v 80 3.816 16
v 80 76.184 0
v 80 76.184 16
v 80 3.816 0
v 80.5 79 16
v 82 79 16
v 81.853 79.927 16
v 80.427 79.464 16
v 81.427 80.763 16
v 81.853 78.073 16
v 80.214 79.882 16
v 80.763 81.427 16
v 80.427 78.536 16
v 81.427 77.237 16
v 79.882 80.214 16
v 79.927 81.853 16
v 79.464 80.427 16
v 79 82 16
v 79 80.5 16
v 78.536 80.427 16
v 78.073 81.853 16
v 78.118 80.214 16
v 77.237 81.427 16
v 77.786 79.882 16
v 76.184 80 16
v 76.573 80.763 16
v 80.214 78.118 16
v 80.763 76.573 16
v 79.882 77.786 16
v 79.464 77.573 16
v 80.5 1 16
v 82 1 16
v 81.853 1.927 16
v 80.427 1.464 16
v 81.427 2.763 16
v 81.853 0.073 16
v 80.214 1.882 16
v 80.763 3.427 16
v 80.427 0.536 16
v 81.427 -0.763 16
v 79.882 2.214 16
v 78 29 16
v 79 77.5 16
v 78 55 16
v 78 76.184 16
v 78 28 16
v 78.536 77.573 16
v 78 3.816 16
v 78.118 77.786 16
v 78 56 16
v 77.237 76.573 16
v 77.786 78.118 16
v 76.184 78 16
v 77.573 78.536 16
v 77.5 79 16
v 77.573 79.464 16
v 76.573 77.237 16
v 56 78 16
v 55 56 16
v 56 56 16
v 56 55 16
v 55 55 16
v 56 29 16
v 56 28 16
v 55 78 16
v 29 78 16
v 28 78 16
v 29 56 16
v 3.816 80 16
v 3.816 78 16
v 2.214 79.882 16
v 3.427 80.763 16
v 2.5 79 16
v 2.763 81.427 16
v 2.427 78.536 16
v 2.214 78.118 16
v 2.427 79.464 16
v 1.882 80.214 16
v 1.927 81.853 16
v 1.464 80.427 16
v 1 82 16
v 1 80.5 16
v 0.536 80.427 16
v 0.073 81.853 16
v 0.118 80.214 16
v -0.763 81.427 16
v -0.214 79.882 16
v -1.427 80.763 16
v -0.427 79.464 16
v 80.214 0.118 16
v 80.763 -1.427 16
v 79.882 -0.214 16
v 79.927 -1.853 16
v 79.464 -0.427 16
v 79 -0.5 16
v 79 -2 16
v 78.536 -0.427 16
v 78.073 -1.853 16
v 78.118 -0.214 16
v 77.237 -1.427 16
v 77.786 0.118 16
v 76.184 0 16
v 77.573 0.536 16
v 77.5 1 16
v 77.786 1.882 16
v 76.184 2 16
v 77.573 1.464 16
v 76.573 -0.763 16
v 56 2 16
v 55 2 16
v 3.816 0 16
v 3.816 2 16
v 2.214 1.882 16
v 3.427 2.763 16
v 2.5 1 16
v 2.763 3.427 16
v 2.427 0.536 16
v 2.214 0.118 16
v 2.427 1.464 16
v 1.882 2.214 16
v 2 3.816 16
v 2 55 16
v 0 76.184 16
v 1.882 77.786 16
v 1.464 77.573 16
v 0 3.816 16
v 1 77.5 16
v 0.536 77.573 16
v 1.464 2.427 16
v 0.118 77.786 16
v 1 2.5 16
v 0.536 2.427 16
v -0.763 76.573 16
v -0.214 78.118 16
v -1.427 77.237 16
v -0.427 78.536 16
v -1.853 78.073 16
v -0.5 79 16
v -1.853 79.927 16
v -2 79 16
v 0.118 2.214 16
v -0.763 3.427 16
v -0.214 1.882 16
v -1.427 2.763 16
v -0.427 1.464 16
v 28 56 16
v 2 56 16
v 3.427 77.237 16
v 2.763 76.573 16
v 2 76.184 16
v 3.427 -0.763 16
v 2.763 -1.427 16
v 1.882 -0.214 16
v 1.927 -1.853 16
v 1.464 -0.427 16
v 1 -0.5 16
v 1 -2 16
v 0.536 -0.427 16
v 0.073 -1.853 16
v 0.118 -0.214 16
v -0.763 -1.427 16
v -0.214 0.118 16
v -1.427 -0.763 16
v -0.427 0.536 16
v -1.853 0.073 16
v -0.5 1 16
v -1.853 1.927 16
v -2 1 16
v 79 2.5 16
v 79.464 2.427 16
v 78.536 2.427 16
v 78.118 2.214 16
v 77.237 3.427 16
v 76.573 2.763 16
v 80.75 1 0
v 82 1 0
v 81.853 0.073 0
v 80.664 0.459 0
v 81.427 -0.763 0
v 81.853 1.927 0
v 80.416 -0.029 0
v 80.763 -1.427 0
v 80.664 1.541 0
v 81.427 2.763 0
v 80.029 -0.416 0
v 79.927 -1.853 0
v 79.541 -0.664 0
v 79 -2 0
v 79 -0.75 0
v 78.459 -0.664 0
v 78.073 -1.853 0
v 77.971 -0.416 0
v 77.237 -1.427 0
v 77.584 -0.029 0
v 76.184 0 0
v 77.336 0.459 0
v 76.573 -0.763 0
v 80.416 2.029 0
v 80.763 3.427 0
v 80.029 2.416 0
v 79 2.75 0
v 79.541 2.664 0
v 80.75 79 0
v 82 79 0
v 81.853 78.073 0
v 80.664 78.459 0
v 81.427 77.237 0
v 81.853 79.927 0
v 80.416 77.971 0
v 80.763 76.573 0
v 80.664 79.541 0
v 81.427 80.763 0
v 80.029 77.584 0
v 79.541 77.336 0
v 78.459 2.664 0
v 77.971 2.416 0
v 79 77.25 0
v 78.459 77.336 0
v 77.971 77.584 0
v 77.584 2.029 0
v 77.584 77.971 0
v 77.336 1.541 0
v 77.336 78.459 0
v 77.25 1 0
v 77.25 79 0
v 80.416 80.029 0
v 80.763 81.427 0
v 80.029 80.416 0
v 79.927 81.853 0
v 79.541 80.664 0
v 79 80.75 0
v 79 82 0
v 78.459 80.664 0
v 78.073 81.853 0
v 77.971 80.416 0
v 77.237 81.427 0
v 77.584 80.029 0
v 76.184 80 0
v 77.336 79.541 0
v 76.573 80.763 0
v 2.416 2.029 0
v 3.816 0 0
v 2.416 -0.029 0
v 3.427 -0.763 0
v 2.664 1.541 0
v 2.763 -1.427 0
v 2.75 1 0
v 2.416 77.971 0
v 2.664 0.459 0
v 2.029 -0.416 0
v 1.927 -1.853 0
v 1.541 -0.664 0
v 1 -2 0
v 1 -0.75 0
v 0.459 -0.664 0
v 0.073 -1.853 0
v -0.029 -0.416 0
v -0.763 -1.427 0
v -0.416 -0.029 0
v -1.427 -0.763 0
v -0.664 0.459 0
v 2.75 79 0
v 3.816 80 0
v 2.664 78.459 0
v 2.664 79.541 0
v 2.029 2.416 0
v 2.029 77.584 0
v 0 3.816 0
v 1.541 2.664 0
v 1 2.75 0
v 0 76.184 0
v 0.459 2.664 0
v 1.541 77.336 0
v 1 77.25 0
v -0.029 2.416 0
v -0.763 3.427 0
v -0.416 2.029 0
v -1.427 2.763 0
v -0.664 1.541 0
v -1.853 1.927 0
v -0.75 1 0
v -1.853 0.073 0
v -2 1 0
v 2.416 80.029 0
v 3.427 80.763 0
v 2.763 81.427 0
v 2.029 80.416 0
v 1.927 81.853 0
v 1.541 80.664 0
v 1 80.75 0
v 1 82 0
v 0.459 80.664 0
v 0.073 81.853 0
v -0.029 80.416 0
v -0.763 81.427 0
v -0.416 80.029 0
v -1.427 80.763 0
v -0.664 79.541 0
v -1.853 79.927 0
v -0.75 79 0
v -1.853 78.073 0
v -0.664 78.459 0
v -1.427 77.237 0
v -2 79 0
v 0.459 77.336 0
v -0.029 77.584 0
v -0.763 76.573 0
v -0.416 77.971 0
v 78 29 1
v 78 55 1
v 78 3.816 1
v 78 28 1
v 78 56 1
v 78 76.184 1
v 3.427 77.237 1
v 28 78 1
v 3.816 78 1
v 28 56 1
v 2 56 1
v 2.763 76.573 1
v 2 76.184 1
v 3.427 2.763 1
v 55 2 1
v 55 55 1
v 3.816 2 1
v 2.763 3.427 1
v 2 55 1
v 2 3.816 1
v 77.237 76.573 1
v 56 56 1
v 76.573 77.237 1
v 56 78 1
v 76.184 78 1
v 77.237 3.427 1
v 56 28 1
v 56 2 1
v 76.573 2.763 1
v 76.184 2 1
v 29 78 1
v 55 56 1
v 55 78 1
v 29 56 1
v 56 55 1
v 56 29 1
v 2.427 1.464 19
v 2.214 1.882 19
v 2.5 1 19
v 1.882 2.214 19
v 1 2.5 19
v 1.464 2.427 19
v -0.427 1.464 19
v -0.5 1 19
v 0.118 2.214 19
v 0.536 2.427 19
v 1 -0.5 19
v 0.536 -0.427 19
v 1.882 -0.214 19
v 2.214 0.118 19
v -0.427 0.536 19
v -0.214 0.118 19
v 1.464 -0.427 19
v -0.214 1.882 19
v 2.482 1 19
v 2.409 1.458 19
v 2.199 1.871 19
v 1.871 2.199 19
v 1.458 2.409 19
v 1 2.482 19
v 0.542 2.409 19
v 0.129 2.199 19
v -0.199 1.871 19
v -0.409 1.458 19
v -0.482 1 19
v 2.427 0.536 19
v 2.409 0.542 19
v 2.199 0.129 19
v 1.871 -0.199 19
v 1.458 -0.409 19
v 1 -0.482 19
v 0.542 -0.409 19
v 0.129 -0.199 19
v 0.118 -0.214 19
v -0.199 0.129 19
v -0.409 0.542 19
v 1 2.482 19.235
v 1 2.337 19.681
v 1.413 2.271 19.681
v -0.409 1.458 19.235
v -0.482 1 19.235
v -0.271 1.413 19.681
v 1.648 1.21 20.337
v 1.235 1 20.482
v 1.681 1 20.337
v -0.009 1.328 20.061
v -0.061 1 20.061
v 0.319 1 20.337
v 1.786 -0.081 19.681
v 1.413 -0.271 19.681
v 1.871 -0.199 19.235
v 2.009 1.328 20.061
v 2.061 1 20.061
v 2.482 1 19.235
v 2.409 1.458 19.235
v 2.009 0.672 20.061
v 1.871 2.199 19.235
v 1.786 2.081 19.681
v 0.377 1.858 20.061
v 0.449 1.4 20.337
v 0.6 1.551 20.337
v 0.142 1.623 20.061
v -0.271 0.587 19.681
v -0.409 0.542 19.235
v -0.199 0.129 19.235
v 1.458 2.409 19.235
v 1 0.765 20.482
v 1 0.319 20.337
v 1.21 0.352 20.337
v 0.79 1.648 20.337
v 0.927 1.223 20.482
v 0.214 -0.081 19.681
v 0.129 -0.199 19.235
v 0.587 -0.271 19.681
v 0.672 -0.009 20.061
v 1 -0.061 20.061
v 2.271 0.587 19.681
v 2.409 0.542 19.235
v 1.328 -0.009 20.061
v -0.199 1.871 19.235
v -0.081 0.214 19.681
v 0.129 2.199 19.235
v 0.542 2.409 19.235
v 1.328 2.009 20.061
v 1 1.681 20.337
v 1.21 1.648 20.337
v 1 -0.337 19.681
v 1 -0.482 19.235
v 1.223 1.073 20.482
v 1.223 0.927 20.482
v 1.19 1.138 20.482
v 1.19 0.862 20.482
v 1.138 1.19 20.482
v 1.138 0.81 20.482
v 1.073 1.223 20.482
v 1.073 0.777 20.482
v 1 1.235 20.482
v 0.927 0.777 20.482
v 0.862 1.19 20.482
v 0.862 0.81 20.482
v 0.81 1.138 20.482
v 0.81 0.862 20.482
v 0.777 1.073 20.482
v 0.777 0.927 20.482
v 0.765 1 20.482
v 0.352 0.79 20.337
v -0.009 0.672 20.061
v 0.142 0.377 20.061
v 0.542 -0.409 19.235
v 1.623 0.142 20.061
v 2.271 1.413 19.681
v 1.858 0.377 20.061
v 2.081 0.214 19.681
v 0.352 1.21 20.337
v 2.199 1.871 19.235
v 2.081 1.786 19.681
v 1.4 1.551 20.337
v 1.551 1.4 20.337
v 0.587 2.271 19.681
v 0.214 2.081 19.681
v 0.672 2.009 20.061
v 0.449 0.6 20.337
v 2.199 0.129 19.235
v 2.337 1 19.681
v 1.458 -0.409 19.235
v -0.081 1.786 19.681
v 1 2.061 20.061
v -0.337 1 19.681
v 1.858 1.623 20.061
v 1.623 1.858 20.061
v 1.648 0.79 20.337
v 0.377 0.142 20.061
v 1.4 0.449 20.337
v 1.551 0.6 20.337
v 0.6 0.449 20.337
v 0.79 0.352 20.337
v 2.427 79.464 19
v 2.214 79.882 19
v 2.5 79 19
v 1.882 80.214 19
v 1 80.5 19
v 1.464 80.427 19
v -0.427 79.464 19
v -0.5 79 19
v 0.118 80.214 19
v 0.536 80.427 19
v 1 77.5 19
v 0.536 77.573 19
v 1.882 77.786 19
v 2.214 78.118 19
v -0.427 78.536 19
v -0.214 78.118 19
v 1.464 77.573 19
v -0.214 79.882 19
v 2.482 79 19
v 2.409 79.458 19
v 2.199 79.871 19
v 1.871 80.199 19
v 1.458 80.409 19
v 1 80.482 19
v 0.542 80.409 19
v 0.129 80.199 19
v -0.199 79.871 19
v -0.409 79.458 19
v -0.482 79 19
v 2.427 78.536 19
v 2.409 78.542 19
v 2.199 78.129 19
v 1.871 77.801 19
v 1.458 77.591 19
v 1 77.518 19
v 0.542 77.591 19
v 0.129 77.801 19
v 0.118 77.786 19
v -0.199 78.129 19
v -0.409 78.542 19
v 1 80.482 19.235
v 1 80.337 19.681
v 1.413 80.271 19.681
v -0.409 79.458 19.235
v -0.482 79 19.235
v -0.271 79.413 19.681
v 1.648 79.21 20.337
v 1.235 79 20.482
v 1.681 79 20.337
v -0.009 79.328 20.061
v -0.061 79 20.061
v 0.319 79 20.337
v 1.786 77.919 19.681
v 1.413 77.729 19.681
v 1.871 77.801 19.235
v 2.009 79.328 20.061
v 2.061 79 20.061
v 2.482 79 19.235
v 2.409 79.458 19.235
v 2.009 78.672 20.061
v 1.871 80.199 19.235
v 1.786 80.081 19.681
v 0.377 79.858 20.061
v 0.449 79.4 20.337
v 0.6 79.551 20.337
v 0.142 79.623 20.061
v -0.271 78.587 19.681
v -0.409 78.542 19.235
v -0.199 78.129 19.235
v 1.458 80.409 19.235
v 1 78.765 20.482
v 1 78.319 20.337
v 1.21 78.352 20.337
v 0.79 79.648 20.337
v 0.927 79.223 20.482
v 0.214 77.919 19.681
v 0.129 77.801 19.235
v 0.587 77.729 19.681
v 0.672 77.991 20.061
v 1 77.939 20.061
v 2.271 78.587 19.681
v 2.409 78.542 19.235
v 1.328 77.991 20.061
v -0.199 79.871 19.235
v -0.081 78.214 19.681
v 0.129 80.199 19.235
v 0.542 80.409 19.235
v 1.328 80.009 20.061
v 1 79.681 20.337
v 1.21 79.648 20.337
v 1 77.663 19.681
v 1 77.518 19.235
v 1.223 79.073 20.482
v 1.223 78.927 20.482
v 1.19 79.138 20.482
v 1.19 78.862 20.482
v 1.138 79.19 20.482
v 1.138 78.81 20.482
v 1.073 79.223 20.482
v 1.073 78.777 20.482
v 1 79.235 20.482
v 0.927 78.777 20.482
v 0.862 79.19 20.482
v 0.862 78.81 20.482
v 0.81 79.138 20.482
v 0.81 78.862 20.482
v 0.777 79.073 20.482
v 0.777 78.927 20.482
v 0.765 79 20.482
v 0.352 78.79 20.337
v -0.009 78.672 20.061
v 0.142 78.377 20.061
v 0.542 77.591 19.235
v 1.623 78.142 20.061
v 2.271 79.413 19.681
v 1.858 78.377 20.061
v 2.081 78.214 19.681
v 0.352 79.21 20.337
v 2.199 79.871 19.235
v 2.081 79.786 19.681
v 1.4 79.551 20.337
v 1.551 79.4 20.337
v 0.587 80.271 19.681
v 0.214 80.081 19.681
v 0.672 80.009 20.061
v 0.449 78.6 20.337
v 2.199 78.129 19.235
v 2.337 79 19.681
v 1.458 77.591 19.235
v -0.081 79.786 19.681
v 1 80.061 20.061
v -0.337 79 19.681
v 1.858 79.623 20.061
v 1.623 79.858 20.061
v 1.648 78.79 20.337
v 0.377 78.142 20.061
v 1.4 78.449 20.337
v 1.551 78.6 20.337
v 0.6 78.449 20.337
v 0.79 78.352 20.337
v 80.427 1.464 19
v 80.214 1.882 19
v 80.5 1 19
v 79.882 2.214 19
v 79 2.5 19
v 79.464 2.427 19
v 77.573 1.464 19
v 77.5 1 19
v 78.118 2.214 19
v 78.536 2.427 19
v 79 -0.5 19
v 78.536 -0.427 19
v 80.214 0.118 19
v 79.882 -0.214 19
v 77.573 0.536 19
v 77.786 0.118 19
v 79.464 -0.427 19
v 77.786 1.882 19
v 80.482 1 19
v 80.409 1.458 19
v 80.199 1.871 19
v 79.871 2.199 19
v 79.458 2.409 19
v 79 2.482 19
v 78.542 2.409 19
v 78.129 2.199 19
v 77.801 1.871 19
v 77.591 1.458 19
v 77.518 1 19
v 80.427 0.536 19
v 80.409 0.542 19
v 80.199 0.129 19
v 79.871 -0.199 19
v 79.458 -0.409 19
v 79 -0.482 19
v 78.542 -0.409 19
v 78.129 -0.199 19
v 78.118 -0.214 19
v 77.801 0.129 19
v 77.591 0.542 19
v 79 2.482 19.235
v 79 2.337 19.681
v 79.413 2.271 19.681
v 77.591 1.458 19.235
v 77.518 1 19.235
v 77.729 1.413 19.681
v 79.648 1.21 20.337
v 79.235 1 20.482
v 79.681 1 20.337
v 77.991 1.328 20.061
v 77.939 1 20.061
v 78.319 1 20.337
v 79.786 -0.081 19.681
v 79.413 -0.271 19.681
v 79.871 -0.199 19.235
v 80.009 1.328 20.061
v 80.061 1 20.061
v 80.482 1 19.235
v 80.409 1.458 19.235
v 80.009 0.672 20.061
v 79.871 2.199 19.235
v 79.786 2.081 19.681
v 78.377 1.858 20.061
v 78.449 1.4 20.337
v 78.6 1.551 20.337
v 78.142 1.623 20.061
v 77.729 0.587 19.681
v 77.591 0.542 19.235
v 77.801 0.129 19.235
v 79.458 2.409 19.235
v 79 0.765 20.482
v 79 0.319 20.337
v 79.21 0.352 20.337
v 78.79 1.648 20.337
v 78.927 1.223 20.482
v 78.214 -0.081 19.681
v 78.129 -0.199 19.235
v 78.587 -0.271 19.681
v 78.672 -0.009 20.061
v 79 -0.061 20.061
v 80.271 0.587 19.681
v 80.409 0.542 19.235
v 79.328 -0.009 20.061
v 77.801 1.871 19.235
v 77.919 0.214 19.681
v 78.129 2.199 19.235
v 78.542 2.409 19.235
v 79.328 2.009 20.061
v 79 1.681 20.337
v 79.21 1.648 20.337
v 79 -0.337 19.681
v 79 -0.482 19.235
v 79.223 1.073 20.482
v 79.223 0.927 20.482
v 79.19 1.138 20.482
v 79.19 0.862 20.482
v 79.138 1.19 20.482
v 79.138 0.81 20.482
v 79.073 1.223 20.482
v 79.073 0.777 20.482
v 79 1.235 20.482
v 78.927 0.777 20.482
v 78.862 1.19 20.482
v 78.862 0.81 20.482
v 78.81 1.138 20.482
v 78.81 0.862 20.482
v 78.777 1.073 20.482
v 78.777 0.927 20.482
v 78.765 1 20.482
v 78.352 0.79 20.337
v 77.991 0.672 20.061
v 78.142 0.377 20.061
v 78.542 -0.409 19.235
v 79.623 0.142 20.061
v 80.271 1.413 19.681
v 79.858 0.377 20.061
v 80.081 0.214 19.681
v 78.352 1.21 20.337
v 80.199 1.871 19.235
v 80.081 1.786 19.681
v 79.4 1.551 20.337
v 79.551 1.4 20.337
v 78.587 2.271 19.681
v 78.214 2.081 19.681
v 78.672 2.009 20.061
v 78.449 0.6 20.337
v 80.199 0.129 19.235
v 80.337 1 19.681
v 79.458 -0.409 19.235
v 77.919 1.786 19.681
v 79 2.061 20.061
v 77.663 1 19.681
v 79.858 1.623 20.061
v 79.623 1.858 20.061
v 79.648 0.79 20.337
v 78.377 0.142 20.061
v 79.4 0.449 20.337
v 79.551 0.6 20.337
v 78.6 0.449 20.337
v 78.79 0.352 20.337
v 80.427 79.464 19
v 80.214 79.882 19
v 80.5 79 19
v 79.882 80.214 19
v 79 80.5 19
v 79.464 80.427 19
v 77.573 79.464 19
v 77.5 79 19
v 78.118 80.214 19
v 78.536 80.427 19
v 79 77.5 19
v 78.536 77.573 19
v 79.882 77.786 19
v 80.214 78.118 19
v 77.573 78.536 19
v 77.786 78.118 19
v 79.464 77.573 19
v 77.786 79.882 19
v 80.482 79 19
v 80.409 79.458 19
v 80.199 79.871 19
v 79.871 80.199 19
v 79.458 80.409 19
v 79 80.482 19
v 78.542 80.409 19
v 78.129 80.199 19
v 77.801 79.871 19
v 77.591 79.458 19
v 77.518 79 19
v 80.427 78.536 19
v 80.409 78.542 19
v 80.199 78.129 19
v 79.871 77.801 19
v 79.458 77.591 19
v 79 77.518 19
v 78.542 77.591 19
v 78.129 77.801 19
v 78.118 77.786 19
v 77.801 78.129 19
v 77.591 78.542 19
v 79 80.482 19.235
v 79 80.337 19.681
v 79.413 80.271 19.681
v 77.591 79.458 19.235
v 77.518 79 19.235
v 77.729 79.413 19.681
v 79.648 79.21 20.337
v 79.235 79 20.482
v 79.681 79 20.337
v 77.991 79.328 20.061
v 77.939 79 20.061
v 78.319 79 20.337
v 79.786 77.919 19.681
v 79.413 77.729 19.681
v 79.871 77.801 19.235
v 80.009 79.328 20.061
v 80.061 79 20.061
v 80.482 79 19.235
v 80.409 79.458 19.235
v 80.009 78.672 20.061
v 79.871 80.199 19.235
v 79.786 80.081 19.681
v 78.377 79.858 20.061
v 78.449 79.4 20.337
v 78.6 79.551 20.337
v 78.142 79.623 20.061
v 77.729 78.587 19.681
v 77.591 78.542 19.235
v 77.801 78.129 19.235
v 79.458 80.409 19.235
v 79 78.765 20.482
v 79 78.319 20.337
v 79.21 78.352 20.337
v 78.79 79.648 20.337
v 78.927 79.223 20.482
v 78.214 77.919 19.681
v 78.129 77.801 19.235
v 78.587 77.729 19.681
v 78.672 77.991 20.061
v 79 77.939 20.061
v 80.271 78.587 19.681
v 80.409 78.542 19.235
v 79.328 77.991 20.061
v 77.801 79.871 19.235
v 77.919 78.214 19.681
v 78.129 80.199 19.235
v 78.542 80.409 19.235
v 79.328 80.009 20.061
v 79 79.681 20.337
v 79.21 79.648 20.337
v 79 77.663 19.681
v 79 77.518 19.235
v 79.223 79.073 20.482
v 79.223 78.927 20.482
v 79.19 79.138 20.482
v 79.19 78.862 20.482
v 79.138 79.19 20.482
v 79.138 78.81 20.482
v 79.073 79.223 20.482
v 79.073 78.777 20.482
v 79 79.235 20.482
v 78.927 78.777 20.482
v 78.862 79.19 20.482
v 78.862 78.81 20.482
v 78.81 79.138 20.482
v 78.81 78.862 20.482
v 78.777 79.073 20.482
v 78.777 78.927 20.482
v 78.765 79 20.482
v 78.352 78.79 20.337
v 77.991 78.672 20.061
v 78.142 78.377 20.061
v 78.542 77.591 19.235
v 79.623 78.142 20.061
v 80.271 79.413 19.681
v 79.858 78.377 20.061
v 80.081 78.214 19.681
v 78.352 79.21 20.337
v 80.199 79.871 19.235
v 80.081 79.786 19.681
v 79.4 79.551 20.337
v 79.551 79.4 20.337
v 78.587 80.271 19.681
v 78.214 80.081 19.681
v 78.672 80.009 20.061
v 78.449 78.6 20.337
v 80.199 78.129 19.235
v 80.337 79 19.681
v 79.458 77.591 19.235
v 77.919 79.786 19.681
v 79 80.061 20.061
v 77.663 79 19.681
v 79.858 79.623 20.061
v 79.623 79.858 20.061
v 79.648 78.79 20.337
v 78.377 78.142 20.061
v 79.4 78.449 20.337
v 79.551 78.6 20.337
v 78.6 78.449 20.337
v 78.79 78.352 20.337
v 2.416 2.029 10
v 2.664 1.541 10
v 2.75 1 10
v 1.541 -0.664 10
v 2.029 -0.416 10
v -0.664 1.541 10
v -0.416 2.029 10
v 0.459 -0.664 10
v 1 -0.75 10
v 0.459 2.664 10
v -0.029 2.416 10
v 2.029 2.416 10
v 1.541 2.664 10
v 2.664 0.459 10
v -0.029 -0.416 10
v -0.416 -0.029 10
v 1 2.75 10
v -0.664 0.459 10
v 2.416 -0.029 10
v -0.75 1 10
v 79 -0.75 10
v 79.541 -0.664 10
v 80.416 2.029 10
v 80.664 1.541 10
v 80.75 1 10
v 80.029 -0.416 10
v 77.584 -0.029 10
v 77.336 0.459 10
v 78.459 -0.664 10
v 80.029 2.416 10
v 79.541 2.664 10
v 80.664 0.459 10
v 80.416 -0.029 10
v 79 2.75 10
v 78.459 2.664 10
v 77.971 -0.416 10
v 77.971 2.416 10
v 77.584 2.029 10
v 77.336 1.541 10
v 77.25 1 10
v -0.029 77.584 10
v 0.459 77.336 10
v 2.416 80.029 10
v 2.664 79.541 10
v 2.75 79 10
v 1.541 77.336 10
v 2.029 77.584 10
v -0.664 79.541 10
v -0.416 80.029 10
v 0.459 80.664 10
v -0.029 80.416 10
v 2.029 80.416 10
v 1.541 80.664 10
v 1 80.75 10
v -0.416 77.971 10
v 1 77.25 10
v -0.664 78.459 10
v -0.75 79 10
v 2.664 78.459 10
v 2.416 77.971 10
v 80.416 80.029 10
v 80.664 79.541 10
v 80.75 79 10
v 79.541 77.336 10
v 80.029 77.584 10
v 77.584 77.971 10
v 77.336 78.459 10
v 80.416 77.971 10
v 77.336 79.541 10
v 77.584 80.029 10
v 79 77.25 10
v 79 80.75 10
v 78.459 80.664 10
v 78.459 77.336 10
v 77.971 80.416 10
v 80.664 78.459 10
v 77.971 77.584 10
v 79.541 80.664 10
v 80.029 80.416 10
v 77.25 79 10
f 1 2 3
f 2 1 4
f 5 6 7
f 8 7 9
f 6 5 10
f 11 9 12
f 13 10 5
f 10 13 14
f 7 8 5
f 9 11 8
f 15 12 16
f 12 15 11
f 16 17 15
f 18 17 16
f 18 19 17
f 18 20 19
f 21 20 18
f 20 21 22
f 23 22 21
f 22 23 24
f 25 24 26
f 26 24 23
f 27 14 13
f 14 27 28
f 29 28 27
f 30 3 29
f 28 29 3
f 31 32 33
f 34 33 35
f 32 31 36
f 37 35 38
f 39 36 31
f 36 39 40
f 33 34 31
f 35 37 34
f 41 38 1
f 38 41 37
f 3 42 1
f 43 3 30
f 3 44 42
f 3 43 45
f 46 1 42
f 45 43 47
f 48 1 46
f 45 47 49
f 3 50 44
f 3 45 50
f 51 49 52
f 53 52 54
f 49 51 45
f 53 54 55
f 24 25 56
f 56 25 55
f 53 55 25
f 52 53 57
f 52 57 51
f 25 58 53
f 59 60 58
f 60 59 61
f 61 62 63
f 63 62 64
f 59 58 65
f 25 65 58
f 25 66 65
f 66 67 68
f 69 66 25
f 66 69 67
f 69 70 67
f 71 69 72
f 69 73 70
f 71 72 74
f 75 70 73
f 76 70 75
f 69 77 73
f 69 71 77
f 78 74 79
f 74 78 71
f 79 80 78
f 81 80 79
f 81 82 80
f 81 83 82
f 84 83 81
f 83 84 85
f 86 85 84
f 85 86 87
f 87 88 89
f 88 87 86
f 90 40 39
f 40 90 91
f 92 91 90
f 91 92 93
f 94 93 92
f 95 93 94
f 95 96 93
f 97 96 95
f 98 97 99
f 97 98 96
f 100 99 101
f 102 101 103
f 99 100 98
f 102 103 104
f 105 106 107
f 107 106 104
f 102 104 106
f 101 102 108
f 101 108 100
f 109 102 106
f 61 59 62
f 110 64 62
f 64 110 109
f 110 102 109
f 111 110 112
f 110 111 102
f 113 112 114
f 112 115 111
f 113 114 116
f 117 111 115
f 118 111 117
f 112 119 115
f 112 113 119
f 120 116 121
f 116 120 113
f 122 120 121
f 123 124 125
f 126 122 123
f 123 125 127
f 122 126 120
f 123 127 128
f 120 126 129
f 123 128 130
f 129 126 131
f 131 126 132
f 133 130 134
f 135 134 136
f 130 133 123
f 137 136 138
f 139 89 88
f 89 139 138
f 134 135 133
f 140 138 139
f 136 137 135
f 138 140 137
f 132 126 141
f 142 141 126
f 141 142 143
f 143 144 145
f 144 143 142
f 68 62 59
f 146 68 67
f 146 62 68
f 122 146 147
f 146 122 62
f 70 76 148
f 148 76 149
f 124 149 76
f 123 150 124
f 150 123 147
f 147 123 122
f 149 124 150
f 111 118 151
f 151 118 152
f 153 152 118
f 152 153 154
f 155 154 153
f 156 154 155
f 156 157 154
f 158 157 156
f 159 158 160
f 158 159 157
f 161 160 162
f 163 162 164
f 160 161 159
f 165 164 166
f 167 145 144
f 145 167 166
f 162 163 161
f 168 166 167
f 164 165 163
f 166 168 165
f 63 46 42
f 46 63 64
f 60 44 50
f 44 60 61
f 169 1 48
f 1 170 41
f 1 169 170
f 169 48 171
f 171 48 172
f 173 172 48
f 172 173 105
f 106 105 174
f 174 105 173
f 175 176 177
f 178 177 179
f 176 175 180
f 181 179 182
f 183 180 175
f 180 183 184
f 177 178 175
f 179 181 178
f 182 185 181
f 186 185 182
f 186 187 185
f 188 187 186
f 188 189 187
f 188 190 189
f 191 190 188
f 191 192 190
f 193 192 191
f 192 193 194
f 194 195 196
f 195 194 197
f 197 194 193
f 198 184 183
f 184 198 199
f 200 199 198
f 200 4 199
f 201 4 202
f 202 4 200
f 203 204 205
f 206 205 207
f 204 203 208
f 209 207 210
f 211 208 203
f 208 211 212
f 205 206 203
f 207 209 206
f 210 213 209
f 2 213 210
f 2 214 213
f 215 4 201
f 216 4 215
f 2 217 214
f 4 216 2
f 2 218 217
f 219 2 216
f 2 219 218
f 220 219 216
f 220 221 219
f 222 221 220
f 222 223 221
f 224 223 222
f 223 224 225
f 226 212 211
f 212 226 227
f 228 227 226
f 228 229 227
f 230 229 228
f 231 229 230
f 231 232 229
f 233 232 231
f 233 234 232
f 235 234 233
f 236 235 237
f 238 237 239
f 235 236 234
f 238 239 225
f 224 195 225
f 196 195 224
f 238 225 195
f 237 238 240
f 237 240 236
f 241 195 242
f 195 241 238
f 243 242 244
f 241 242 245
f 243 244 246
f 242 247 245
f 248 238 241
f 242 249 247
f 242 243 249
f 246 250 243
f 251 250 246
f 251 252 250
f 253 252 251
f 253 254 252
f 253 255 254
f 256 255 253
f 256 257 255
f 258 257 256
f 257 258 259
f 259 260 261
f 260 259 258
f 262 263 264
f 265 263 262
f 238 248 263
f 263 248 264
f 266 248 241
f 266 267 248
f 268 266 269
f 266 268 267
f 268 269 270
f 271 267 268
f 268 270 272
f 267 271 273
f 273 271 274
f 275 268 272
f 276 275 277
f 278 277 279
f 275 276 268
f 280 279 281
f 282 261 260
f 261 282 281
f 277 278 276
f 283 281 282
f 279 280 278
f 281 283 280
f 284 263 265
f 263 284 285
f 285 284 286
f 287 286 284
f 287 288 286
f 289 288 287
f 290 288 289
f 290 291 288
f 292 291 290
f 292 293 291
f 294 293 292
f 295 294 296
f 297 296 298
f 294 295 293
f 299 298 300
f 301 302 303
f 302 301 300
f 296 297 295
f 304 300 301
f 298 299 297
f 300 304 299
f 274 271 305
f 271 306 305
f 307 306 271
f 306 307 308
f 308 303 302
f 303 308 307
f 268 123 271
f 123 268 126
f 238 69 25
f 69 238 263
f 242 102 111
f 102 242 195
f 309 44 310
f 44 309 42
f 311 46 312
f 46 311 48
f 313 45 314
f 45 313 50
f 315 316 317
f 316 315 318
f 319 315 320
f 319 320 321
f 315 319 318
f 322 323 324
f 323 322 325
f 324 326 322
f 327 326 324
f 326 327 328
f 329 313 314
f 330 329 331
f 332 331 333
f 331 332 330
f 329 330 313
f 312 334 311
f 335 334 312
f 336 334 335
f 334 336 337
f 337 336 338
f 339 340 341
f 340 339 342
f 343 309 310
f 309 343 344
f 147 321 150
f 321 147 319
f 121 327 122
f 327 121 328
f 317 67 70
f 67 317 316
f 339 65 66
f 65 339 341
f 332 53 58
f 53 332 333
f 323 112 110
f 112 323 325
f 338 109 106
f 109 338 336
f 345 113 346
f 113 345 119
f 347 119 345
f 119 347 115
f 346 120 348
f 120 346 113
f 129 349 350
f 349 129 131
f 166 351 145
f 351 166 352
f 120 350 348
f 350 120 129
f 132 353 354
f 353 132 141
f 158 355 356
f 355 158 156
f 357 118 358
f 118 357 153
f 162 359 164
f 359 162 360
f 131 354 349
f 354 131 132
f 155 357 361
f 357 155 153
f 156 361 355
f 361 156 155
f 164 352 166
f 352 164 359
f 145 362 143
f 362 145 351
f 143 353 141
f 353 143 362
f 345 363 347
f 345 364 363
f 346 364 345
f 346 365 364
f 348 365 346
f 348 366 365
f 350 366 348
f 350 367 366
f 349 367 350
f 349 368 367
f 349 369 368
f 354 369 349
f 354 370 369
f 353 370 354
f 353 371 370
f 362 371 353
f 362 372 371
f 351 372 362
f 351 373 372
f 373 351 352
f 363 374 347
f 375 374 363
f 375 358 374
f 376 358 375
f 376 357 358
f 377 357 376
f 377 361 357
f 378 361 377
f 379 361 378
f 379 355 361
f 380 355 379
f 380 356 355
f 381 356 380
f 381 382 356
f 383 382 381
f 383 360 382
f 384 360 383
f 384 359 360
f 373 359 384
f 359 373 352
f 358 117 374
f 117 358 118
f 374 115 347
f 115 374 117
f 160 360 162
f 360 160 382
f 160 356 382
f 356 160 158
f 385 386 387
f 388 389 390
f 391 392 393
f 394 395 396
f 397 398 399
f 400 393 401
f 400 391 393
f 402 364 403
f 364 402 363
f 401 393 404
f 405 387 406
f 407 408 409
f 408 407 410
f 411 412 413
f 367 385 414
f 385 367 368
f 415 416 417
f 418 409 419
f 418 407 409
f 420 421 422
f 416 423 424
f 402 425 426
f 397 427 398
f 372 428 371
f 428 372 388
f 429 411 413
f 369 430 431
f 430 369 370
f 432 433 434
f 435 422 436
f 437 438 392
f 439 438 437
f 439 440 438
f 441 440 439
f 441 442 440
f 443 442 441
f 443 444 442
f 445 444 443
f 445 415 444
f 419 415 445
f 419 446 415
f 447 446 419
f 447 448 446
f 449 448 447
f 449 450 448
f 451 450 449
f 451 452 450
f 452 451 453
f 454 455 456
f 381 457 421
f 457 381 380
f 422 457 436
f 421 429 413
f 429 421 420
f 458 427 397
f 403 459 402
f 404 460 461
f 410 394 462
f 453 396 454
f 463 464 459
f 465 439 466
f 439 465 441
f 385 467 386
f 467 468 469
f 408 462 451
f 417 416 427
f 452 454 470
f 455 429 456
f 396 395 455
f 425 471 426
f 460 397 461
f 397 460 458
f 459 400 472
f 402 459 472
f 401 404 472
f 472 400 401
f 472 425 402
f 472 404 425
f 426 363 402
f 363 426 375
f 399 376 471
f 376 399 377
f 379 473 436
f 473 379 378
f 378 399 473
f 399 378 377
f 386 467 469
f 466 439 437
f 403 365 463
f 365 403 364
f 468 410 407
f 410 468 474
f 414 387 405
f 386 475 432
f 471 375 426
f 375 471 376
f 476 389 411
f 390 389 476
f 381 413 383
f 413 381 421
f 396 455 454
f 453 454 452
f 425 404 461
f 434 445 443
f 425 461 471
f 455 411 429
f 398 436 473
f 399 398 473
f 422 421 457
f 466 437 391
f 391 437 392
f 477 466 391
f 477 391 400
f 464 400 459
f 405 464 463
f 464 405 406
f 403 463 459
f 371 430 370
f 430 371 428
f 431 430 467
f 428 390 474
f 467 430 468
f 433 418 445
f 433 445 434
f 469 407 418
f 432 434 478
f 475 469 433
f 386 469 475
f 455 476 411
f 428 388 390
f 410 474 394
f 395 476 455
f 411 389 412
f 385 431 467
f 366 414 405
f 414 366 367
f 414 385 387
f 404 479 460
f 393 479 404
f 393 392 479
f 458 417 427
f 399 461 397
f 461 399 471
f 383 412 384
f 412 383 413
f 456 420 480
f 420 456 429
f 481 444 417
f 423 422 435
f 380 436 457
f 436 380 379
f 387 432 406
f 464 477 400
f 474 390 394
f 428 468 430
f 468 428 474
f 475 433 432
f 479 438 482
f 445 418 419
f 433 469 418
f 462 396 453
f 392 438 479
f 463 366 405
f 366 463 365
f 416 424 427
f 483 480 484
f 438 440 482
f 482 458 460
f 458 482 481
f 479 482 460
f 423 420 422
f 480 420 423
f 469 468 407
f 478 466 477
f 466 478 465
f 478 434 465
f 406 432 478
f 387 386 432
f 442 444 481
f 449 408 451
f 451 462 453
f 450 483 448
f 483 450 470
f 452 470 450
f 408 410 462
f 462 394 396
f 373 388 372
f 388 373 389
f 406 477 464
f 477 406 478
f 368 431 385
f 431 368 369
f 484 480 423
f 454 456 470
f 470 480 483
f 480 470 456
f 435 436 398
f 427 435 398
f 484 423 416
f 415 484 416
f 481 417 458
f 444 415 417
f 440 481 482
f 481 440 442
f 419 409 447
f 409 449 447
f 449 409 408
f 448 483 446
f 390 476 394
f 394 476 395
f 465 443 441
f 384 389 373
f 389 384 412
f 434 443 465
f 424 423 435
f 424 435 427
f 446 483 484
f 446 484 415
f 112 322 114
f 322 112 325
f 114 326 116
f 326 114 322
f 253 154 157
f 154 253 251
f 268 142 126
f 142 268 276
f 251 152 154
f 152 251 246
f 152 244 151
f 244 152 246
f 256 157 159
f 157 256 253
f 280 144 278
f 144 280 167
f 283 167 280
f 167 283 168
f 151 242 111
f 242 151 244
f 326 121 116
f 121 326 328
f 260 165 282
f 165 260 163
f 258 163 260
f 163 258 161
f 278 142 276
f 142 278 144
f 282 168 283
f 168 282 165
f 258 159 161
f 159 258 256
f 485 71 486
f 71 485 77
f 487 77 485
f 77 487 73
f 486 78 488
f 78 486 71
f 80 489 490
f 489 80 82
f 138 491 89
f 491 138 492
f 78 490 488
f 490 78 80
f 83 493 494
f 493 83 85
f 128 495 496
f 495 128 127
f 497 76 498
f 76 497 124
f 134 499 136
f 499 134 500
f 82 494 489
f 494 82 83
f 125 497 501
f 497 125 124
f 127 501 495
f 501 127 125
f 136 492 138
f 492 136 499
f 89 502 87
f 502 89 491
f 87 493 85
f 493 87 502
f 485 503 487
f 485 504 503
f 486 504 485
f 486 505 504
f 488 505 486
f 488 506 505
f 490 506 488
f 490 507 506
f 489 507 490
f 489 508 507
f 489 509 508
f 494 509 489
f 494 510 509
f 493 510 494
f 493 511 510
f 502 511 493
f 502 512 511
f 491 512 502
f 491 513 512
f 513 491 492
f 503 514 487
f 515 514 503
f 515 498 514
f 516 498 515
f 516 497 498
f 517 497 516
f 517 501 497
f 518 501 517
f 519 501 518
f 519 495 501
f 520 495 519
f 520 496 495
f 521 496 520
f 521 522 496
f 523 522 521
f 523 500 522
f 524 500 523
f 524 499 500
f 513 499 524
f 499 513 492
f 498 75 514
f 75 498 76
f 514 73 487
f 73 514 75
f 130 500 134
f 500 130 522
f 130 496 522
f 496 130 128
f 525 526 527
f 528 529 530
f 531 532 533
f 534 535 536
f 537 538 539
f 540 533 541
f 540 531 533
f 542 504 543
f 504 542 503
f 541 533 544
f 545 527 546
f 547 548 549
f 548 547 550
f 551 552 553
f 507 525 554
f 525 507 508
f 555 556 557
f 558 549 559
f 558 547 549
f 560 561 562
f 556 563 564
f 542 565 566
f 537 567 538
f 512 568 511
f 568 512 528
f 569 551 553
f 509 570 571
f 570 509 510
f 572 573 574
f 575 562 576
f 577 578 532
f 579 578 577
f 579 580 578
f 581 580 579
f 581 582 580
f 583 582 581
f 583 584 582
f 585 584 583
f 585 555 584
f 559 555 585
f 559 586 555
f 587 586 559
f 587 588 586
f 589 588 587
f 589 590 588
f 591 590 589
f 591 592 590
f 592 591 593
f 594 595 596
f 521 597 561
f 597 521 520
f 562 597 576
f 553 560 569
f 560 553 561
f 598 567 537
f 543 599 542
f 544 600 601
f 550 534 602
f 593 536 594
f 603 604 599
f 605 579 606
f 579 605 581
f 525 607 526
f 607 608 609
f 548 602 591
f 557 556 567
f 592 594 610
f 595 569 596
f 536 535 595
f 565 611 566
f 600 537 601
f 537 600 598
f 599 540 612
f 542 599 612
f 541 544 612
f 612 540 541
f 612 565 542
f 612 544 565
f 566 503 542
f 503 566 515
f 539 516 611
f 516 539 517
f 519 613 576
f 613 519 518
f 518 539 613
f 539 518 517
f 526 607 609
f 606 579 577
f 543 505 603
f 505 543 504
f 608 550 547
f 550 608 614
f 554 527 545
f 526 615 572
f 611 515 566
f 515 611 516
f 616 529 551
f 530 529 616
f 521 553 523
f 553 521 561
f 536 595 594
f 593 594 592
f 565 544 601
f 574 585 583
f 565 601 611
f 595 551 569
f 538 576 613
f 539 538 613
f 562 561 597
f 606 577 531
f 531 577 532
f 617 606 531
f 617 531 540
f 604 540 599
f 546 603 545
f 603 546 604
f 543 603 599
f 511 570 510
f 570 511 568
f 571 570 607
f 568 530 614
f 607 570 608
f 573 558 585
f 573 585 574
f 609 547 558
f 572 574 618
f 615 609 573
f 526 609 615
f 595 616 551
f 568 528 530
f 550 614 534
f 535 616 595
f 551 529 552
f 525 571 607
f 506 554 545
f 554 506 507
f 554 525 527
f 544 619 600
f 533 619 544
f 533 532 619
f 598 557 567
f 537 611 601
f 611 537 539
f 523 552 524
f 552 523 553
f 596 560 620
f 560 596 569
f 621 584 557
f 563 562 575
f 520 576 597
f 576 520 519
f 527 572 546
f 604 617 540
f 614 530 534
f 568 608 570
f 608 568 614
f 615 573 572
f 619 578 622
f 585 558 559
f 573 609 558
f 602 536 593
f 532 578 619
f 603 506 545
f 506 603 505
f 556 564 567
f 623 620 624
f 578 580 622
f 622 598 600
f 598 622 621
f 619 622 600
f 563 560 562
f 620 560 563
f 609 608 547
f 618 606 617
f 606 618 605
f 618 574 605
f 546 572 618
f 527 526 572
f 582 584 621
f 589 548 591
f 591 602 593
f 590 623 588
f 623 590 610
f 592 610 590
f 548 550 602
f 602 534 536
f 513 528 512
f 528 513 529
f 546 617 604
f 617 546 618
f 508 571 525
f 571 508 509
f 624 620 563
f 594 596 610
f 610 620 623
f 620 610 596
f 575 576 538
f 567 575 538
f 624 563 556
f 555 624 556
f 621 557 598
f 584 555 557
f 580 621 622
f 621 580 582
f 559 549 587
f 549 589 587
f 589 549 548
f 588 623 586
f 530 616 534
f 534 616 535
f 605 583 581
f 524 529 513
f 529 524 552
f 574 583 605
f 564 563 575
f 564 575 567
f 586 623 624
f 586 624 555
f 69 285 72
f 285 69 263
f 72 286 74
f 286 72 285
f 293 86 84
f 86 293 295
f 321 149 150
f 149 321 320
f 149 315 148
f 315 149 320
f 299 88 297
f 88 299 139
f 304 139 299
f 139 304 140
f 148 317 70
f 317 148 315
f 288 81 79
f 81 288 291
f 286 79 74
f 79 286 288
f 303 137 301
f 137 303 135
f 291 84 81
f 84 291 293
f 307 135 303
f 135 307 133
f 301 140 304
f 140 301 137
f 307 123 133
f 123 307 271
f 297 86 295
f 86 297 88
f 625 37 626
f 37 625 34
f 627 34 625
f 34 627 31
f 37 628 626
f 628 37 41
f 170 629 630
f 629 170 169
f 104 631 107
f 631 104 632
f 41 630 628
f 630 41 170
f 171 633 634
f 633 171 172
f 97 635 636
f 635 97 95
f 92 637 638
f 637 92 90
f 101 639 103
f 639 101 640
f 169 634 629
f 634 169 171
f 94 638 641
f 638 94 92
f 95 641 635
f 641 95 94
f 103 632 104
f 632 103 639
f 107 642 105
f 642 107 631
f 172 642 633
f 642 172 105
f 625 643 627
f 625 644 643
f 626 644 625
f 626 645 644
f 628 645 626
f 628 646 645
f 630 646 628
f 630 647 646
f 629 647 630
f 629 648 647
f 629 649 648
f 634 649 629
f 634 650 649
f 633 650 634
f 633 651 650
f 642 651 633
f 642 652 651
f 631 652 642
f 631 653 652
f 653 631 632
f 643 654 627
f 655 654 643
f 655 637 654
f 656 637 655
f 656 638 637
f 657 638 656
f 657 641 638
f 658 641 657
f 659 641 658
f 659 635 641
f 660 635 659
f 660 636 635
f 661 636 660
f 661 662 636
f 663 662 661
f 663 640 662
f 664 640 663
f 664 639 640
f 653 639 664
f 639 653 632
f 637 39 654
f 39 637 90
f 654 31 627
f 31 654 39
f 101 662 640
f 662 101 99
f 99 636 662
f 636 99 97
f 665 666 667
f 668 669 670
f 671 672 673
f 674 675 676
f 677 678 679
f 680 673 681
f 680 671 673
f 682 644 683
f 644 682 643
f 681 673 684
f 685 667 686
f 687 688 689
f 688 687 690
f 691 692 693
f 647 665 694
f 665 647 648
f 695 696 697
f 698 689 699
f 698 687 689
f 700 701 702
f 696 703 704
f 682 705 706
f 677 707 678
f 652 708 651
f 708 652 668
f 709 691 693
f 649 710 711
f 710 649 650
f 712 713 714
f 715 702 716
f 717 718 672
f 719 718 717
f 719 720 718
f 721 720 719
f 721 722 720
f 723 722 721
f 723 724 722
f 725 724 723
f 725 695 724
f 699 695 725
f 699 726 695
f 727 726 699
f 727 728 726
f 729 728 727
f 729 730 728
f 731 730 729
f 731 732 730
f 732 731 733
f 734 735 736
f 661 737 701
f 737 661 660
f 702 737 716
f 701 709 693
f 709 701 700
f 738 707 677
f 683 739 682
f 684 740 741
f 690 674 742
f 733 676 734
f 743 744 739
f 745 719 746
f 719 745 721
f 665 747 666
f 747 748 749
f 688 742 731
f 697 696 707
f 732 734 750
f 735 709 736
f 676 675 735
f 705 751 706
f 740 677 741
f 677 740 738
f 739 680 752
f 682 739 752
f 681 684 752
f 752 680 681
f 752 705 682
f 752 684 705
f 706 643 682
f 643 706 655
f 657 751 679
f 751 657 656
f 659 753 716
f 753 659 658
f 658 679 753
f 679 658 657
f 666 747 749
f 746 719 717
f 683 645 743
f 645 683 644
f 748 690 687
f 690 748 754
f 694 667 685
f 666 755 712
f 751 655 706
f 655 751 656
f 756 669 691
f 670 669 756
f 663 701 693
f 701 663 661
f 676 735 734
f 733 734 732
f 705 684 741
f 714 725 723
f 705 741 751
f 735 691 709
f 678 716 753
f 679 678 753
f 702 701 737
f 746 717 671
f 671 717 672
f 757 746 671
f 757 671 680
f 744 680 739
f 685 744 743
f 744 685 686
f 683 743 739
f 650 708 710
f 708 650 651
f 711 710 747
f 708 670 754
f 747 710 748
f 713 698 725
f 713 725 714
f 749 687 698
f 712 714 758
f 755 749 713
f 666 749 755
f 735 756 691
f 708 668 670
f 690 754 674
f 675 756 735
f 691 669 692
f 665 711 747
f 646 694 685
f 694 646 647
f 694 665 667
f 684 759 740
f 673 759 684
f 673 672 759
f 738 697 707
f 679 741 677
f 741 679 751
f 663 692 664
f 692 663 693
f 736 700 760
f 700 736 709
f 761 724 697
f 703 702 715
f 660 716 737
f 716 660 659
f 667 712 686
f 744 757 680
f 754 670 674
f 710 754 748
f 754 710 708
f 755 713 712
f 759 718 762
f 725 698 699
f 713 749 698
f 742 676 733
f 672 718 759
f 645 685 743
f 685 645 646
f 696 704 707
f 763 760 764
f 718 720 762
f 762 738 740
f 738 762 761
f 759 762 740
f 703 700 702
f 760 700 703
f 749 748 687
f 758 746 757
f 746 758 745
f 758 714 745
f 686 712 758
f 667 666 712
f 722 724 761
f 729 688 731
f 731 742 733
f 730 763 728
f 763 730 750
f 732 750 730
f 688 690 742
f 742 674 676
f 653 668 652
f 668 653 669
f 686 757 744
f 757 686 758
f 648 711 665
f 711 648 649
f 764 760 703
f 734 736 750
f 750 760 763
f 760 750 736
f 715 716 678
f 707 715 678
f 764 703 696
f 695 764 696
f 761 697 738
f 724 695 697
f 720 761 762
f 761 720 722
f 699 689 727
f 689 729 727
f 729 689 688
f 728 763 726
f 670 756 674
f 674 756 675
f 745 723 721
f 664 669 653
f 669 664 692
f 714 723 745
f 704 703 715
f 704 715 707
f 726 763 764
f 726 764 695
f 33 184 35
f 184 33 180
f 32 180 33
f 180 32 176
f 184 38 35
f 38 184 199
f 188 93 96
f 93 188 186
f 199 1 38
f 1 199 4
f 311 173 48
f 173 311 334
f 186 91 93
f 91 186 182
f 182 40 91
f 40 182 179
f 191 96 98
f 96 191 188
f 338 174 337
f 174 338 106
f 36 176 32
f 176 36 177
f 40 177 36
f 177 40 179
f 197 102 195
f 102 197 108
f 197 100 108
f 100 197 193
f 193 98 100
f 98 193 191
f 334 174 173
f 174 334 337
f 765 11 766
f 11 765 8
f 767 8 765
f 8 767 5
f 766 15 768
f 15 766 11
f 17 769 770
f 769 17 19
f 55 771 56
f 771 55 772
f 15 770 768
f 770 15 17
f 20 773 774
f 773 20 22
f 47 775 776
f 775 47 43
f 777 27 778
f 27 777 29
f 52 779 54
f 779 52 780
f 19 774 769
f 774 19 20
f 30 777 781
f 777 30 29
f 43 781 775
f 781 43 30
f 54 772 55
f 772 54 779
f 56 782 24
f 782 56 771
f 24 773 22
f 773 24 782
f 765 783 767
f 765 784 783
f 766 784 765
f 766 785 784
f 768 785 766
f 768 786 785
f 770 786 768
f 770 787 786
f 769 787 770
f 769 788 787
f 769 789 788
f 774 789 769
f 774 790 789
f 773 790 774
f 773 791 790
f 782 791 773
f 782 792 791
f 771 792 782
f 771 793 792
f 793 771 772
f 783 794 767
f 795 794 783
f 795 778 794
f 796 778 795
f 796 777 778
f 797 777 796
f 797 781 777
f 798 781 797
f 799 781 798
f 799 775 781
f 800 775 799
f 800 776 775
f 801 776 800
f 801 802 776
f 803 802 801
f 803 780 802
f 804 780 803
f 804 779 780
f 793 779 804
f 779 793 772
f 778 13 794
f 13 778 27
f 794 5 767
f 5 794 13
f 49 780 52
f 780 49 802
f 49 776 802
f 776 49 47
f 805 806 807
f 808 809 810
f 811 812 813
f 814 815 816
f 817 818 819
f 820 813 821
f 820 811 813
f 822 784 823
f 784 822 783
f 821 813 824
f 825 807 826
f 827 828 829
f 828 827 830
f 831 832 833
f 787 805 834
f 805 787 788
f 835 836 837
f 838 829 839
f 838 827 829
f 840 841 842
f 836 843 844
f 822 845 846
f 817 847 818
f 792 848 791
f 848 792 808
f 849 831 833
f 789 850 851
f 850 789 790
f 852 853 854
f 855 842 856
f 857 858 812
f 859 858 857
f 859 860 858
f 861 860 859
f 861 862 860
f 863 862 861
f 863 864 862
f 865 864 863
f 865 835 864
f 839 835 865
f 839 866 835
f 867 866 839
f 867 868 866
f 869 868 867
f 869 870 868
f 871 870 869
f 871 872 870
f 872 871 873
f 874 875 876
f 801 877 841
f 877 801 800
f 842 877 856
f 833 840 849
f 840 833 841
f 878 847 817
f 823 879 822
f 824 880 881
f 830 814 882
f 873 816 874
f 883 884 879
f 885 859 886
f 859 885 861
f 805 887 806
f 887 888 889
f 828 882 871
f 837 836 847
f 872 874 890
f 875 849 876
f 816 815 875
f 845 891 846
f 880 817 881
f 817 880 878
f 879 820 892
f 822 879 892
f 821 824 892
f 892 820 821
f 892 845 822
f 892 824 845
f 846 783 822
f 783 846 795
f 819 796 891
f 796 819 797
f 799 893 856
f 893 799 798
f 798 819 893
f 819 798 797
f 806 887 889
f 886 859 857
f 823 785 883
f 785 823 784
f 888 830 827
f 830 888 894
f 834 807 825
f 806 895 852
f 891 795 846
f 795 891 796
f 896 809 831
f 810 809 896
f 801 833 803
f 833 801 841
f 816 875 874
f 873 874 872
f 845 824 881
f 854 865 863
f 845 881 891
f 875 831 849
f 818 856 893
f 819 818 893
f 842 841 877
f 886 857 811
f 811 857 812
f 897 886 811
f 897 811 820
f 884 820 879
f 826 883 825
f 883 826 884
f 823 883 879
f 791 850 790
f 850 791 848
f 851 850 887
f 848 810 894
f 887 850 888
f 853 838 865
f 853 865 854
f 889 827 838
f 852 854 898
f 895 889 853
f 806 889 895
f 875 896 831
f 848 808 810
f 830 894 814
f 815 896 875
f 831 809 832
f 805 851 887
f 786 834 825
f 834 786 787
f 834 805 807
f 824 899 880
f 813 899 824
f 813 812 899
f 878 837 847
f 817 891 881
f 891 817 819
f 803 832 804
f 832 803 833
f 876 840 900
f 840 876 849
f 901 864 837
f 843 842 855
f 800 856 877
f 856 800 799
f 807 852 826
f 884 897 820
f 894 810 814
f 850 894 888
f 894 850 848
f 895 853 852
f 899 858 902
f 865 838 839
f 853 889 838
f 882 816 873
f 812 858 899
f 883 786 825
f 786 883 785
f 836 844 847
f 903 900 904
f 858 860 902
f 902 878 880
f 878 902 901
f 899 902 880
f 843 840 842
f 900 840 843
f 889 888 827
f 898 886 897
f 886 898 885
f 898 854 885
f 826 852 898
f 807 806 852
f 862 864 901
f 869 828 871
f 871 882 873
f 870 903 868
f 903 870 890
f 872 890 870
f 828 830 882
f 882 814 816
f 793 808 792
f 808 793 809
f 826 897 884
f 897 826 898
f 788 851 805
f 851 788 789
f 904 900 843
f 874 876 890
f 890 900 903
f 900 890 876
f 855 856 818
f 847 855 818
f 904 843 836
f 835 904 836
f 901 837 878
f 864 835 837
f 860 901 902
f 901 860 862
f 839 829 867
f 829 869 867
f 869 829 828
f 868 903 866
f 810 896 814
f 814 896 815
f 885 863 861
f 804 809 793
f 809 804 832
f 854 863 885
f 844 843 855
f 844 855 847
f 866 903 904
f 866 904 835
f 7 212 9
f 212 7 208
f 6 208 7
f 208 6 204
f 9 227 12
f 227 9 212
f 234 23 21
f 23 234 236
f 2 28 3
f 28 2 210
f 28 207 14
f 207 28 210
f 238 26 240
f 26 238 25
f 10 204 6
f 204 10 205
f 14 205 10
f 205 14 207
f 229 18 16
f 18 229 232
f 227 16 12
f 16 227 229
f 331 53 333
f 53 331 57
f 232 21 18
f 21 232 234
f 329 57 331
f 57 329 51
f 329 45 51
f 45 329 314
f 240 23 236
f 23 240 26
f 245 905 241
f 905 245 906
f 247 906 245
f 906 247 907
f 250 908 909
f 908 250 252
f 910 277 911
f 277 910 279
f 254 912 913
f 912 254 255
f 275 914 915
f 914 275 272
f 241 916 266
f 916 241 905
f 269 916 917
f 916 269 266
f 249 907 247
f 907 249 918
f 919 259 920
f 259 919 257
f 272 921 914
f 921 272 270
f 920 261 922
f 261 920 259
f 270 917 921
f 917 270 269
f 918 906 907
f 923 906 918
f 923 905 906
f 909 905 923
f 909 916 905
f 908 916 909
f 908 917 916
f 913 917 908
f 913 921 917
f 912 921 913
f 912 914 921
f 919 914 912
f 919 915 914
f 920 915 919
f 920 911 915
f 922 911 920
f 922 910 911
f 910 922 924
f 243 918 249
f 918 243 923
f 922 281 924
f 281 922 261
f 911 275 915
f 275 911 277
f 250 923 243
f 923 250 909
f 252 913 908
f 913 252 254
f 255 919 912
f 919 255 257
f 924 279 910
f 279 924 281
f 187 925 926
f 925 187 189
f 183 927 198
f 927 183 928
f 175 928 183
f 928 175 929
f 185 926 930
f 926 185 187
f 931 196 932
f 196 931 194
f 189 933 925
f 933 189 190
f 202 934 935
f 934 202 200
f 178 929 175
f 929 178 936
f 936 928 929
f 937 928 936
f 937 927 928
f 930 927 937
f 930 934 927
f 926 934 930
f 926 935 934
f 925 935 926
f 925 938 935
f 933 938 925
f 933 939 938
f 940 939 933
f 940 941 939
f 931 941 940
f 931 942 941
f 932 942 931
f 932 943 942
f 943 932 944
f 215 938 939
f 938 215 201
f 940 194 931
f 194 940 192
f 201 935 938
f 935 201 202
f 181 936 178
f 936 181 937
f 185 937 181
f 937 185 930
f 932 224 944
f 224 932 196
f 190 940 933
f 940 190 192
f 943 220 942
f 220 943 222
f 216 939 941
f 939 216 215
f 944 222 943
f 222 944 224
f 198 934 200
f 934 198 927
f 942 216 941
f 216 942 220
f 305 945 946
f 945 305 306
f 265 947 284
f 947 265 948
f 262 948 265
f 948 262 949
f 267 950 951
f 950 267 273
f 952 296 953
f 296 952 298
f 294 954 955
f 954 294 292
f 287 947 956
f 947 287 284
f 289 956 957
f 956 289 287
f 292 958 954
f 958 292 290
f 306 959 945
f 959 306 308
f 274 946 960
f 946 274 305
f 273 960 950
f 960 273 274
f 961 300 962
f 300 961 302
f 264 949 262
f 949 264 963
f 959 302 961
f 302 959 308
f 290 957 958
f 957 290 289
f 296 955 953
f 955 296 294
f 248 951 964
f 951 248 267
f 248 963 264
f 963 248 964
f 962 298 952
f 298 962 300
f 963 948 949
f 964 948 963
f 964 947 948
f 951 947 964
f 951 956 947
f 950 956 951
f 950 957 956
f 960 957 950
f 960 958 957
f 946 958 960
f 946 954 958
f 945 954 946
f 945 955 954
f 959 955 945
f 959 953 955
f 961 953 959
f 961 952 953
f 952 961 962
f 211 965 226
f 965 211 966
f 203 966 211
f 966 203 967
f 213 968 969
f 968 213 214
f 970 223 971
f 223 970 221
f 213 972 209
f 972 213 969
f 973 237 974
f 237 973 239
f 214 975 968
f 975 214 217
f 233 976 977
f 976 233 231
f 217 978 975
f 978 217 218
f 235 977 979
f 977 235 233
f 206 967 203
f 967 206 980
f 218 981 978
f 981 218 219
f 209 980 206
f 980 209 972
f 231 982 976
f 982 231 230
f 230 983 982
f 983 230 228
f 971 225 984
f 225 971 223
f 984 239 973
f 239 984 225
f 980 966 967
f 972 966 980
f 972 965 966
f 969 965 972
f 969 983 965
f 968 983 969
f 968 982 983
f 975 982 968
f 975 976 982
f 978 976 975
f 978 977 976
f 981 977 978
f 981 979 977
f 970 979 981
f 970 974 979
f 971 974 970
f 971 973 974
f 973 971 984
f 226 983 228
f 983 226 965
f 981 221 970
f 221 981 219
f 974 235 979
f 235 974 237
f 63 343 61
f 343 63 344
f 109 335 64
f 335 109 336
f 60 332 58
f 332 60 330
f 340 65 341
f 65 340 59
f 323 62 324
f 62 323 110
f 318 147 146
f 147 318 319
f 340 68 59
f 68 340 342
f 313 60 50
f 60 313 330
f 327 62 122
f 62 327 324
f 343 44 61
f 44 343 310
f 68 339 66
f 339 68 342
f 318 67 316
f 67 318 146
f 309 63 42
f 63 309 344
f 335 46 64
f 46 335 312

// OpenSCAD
// Box with a slot of given size and fill the rest with pattern

height = 16;
wall_outer_thickness = 2;
base_thickness = 1;
wall_inner_thickness = 1;
slot_x = 53;
slot_y = 53;
rest_walls_x = 1;
rest_walls_y = 1;

$fn = 20;
pin_diameter = 3;
pin_height = 3;
pin_hole_diameter = 3.5;
pin_hole_height = 10;
corner_outer_diameter = 6;
base_side = 80;
base_size = [base_side, base_side, height];

function corner_coords(i, j) = [
    i * base_side + (1/2-i)*wall_outer_thickness, 
    j * base_side + (1/2-j)*wall_outer_thickness, 
    0];

module corner(i, j) {
    translate(corner_coords(i, j))
        {
            cylinder(h = height, d = corner_outer_diameter);
            translate([0, 0, height]) {
                cylinder(h = pin_height, d = pin_diameter);
                translate([0, 0, pin_height])
                    sphere(d = pin_diameter);
            }
        }
}

module pin_hole(i, j) {
    translate(corner_coords(i, j))
        translate([0, 0, -1])
            cylinder(h = pin_hole_height+1, d = pin_hole_diameter);
}

union() {
    difference() {
        union() {
            difference() {
                cube(base_size, center = false);
                translate([wall_outer_thickness, wall_outer_thickness, base_thickness])
                    cube(base_size - [wall_outer_thickness*2, wall_outer_thickness*2, 0]);
            }
            corner(0, 0);
            corner(0, 1);
            corner(1, 0);
            corner(1, 1);
        }
        pin_hole(0, 0);
        pin_hole(1, 0);
        pin_hole(0, 1);
        pin_hole(1, 1);
    }
}

/*
inner_space = base_side - wall_outer_thickness*2 + wall_inner_thickness;
x_ofs = inner_space / slots_x;
y_ofs = inner_space / slots_y;
translate([wall_outer_thickness, 0, 0])
    for (i = [1:slots_x-1]) {
        translate([i*x_ofs - wall_inner_thickness, 0, 0])
            cube([wall_inner_thickness, base_side, height]);
    }

translate([0, wall_outer_thickness, 0])
    for (i = [1:slots_y-1]) {
        translate([0, i*y_ofs - wall_inner_thickness, 0])
            cube([base_side, wall_inner_thickness, height]);
    }
*/

translate([slot_x + wall_outer_thickness, 0, 0])
    cube([wall_inner_thickness, base_side, height]);
    
translate([0, slot_y + wall_outer_thickness, 0])
    cube([base_side, wall_inner_thickness, height]);

inner_space = base_side - wall_outer_thickness*2;
x_ofs = wall_outer_thickness + slot_x + wall_inner_thickness;
y_ofs = wall_outer_thickness + slot_y + wall_inner_thickness;
rest_x = base_side - x_ofs - wall_outer_thickness;
rest_y = base_side - y_ofs - wall_outer_thickness;

if (rest_walls_x > 0) {
    step_x = (slot_x + wall_inner_thickness) / (rest_walls_x+1);
    
    for (i = [1:rest_walls_x]) {
        translate([wall_outer_thickness + i*step_x - wall_inner_thickness, y_ofs, 0])
            cube([wall_inner_thickness, rest_y, height]);
    }
}

if (rest_walls_y > 0) {
    step_y = (slot_y + wall_inner_thickness) / (rest_walls_y+1);
    
    for (i = [1:rest_walls_y]) {
        translate([x_ofs, wall_outer_thickness + i*step_y - wall_inner_thickness, 0])
            cube([rest_x, wall_inner_thickness, height]);
    }
}
